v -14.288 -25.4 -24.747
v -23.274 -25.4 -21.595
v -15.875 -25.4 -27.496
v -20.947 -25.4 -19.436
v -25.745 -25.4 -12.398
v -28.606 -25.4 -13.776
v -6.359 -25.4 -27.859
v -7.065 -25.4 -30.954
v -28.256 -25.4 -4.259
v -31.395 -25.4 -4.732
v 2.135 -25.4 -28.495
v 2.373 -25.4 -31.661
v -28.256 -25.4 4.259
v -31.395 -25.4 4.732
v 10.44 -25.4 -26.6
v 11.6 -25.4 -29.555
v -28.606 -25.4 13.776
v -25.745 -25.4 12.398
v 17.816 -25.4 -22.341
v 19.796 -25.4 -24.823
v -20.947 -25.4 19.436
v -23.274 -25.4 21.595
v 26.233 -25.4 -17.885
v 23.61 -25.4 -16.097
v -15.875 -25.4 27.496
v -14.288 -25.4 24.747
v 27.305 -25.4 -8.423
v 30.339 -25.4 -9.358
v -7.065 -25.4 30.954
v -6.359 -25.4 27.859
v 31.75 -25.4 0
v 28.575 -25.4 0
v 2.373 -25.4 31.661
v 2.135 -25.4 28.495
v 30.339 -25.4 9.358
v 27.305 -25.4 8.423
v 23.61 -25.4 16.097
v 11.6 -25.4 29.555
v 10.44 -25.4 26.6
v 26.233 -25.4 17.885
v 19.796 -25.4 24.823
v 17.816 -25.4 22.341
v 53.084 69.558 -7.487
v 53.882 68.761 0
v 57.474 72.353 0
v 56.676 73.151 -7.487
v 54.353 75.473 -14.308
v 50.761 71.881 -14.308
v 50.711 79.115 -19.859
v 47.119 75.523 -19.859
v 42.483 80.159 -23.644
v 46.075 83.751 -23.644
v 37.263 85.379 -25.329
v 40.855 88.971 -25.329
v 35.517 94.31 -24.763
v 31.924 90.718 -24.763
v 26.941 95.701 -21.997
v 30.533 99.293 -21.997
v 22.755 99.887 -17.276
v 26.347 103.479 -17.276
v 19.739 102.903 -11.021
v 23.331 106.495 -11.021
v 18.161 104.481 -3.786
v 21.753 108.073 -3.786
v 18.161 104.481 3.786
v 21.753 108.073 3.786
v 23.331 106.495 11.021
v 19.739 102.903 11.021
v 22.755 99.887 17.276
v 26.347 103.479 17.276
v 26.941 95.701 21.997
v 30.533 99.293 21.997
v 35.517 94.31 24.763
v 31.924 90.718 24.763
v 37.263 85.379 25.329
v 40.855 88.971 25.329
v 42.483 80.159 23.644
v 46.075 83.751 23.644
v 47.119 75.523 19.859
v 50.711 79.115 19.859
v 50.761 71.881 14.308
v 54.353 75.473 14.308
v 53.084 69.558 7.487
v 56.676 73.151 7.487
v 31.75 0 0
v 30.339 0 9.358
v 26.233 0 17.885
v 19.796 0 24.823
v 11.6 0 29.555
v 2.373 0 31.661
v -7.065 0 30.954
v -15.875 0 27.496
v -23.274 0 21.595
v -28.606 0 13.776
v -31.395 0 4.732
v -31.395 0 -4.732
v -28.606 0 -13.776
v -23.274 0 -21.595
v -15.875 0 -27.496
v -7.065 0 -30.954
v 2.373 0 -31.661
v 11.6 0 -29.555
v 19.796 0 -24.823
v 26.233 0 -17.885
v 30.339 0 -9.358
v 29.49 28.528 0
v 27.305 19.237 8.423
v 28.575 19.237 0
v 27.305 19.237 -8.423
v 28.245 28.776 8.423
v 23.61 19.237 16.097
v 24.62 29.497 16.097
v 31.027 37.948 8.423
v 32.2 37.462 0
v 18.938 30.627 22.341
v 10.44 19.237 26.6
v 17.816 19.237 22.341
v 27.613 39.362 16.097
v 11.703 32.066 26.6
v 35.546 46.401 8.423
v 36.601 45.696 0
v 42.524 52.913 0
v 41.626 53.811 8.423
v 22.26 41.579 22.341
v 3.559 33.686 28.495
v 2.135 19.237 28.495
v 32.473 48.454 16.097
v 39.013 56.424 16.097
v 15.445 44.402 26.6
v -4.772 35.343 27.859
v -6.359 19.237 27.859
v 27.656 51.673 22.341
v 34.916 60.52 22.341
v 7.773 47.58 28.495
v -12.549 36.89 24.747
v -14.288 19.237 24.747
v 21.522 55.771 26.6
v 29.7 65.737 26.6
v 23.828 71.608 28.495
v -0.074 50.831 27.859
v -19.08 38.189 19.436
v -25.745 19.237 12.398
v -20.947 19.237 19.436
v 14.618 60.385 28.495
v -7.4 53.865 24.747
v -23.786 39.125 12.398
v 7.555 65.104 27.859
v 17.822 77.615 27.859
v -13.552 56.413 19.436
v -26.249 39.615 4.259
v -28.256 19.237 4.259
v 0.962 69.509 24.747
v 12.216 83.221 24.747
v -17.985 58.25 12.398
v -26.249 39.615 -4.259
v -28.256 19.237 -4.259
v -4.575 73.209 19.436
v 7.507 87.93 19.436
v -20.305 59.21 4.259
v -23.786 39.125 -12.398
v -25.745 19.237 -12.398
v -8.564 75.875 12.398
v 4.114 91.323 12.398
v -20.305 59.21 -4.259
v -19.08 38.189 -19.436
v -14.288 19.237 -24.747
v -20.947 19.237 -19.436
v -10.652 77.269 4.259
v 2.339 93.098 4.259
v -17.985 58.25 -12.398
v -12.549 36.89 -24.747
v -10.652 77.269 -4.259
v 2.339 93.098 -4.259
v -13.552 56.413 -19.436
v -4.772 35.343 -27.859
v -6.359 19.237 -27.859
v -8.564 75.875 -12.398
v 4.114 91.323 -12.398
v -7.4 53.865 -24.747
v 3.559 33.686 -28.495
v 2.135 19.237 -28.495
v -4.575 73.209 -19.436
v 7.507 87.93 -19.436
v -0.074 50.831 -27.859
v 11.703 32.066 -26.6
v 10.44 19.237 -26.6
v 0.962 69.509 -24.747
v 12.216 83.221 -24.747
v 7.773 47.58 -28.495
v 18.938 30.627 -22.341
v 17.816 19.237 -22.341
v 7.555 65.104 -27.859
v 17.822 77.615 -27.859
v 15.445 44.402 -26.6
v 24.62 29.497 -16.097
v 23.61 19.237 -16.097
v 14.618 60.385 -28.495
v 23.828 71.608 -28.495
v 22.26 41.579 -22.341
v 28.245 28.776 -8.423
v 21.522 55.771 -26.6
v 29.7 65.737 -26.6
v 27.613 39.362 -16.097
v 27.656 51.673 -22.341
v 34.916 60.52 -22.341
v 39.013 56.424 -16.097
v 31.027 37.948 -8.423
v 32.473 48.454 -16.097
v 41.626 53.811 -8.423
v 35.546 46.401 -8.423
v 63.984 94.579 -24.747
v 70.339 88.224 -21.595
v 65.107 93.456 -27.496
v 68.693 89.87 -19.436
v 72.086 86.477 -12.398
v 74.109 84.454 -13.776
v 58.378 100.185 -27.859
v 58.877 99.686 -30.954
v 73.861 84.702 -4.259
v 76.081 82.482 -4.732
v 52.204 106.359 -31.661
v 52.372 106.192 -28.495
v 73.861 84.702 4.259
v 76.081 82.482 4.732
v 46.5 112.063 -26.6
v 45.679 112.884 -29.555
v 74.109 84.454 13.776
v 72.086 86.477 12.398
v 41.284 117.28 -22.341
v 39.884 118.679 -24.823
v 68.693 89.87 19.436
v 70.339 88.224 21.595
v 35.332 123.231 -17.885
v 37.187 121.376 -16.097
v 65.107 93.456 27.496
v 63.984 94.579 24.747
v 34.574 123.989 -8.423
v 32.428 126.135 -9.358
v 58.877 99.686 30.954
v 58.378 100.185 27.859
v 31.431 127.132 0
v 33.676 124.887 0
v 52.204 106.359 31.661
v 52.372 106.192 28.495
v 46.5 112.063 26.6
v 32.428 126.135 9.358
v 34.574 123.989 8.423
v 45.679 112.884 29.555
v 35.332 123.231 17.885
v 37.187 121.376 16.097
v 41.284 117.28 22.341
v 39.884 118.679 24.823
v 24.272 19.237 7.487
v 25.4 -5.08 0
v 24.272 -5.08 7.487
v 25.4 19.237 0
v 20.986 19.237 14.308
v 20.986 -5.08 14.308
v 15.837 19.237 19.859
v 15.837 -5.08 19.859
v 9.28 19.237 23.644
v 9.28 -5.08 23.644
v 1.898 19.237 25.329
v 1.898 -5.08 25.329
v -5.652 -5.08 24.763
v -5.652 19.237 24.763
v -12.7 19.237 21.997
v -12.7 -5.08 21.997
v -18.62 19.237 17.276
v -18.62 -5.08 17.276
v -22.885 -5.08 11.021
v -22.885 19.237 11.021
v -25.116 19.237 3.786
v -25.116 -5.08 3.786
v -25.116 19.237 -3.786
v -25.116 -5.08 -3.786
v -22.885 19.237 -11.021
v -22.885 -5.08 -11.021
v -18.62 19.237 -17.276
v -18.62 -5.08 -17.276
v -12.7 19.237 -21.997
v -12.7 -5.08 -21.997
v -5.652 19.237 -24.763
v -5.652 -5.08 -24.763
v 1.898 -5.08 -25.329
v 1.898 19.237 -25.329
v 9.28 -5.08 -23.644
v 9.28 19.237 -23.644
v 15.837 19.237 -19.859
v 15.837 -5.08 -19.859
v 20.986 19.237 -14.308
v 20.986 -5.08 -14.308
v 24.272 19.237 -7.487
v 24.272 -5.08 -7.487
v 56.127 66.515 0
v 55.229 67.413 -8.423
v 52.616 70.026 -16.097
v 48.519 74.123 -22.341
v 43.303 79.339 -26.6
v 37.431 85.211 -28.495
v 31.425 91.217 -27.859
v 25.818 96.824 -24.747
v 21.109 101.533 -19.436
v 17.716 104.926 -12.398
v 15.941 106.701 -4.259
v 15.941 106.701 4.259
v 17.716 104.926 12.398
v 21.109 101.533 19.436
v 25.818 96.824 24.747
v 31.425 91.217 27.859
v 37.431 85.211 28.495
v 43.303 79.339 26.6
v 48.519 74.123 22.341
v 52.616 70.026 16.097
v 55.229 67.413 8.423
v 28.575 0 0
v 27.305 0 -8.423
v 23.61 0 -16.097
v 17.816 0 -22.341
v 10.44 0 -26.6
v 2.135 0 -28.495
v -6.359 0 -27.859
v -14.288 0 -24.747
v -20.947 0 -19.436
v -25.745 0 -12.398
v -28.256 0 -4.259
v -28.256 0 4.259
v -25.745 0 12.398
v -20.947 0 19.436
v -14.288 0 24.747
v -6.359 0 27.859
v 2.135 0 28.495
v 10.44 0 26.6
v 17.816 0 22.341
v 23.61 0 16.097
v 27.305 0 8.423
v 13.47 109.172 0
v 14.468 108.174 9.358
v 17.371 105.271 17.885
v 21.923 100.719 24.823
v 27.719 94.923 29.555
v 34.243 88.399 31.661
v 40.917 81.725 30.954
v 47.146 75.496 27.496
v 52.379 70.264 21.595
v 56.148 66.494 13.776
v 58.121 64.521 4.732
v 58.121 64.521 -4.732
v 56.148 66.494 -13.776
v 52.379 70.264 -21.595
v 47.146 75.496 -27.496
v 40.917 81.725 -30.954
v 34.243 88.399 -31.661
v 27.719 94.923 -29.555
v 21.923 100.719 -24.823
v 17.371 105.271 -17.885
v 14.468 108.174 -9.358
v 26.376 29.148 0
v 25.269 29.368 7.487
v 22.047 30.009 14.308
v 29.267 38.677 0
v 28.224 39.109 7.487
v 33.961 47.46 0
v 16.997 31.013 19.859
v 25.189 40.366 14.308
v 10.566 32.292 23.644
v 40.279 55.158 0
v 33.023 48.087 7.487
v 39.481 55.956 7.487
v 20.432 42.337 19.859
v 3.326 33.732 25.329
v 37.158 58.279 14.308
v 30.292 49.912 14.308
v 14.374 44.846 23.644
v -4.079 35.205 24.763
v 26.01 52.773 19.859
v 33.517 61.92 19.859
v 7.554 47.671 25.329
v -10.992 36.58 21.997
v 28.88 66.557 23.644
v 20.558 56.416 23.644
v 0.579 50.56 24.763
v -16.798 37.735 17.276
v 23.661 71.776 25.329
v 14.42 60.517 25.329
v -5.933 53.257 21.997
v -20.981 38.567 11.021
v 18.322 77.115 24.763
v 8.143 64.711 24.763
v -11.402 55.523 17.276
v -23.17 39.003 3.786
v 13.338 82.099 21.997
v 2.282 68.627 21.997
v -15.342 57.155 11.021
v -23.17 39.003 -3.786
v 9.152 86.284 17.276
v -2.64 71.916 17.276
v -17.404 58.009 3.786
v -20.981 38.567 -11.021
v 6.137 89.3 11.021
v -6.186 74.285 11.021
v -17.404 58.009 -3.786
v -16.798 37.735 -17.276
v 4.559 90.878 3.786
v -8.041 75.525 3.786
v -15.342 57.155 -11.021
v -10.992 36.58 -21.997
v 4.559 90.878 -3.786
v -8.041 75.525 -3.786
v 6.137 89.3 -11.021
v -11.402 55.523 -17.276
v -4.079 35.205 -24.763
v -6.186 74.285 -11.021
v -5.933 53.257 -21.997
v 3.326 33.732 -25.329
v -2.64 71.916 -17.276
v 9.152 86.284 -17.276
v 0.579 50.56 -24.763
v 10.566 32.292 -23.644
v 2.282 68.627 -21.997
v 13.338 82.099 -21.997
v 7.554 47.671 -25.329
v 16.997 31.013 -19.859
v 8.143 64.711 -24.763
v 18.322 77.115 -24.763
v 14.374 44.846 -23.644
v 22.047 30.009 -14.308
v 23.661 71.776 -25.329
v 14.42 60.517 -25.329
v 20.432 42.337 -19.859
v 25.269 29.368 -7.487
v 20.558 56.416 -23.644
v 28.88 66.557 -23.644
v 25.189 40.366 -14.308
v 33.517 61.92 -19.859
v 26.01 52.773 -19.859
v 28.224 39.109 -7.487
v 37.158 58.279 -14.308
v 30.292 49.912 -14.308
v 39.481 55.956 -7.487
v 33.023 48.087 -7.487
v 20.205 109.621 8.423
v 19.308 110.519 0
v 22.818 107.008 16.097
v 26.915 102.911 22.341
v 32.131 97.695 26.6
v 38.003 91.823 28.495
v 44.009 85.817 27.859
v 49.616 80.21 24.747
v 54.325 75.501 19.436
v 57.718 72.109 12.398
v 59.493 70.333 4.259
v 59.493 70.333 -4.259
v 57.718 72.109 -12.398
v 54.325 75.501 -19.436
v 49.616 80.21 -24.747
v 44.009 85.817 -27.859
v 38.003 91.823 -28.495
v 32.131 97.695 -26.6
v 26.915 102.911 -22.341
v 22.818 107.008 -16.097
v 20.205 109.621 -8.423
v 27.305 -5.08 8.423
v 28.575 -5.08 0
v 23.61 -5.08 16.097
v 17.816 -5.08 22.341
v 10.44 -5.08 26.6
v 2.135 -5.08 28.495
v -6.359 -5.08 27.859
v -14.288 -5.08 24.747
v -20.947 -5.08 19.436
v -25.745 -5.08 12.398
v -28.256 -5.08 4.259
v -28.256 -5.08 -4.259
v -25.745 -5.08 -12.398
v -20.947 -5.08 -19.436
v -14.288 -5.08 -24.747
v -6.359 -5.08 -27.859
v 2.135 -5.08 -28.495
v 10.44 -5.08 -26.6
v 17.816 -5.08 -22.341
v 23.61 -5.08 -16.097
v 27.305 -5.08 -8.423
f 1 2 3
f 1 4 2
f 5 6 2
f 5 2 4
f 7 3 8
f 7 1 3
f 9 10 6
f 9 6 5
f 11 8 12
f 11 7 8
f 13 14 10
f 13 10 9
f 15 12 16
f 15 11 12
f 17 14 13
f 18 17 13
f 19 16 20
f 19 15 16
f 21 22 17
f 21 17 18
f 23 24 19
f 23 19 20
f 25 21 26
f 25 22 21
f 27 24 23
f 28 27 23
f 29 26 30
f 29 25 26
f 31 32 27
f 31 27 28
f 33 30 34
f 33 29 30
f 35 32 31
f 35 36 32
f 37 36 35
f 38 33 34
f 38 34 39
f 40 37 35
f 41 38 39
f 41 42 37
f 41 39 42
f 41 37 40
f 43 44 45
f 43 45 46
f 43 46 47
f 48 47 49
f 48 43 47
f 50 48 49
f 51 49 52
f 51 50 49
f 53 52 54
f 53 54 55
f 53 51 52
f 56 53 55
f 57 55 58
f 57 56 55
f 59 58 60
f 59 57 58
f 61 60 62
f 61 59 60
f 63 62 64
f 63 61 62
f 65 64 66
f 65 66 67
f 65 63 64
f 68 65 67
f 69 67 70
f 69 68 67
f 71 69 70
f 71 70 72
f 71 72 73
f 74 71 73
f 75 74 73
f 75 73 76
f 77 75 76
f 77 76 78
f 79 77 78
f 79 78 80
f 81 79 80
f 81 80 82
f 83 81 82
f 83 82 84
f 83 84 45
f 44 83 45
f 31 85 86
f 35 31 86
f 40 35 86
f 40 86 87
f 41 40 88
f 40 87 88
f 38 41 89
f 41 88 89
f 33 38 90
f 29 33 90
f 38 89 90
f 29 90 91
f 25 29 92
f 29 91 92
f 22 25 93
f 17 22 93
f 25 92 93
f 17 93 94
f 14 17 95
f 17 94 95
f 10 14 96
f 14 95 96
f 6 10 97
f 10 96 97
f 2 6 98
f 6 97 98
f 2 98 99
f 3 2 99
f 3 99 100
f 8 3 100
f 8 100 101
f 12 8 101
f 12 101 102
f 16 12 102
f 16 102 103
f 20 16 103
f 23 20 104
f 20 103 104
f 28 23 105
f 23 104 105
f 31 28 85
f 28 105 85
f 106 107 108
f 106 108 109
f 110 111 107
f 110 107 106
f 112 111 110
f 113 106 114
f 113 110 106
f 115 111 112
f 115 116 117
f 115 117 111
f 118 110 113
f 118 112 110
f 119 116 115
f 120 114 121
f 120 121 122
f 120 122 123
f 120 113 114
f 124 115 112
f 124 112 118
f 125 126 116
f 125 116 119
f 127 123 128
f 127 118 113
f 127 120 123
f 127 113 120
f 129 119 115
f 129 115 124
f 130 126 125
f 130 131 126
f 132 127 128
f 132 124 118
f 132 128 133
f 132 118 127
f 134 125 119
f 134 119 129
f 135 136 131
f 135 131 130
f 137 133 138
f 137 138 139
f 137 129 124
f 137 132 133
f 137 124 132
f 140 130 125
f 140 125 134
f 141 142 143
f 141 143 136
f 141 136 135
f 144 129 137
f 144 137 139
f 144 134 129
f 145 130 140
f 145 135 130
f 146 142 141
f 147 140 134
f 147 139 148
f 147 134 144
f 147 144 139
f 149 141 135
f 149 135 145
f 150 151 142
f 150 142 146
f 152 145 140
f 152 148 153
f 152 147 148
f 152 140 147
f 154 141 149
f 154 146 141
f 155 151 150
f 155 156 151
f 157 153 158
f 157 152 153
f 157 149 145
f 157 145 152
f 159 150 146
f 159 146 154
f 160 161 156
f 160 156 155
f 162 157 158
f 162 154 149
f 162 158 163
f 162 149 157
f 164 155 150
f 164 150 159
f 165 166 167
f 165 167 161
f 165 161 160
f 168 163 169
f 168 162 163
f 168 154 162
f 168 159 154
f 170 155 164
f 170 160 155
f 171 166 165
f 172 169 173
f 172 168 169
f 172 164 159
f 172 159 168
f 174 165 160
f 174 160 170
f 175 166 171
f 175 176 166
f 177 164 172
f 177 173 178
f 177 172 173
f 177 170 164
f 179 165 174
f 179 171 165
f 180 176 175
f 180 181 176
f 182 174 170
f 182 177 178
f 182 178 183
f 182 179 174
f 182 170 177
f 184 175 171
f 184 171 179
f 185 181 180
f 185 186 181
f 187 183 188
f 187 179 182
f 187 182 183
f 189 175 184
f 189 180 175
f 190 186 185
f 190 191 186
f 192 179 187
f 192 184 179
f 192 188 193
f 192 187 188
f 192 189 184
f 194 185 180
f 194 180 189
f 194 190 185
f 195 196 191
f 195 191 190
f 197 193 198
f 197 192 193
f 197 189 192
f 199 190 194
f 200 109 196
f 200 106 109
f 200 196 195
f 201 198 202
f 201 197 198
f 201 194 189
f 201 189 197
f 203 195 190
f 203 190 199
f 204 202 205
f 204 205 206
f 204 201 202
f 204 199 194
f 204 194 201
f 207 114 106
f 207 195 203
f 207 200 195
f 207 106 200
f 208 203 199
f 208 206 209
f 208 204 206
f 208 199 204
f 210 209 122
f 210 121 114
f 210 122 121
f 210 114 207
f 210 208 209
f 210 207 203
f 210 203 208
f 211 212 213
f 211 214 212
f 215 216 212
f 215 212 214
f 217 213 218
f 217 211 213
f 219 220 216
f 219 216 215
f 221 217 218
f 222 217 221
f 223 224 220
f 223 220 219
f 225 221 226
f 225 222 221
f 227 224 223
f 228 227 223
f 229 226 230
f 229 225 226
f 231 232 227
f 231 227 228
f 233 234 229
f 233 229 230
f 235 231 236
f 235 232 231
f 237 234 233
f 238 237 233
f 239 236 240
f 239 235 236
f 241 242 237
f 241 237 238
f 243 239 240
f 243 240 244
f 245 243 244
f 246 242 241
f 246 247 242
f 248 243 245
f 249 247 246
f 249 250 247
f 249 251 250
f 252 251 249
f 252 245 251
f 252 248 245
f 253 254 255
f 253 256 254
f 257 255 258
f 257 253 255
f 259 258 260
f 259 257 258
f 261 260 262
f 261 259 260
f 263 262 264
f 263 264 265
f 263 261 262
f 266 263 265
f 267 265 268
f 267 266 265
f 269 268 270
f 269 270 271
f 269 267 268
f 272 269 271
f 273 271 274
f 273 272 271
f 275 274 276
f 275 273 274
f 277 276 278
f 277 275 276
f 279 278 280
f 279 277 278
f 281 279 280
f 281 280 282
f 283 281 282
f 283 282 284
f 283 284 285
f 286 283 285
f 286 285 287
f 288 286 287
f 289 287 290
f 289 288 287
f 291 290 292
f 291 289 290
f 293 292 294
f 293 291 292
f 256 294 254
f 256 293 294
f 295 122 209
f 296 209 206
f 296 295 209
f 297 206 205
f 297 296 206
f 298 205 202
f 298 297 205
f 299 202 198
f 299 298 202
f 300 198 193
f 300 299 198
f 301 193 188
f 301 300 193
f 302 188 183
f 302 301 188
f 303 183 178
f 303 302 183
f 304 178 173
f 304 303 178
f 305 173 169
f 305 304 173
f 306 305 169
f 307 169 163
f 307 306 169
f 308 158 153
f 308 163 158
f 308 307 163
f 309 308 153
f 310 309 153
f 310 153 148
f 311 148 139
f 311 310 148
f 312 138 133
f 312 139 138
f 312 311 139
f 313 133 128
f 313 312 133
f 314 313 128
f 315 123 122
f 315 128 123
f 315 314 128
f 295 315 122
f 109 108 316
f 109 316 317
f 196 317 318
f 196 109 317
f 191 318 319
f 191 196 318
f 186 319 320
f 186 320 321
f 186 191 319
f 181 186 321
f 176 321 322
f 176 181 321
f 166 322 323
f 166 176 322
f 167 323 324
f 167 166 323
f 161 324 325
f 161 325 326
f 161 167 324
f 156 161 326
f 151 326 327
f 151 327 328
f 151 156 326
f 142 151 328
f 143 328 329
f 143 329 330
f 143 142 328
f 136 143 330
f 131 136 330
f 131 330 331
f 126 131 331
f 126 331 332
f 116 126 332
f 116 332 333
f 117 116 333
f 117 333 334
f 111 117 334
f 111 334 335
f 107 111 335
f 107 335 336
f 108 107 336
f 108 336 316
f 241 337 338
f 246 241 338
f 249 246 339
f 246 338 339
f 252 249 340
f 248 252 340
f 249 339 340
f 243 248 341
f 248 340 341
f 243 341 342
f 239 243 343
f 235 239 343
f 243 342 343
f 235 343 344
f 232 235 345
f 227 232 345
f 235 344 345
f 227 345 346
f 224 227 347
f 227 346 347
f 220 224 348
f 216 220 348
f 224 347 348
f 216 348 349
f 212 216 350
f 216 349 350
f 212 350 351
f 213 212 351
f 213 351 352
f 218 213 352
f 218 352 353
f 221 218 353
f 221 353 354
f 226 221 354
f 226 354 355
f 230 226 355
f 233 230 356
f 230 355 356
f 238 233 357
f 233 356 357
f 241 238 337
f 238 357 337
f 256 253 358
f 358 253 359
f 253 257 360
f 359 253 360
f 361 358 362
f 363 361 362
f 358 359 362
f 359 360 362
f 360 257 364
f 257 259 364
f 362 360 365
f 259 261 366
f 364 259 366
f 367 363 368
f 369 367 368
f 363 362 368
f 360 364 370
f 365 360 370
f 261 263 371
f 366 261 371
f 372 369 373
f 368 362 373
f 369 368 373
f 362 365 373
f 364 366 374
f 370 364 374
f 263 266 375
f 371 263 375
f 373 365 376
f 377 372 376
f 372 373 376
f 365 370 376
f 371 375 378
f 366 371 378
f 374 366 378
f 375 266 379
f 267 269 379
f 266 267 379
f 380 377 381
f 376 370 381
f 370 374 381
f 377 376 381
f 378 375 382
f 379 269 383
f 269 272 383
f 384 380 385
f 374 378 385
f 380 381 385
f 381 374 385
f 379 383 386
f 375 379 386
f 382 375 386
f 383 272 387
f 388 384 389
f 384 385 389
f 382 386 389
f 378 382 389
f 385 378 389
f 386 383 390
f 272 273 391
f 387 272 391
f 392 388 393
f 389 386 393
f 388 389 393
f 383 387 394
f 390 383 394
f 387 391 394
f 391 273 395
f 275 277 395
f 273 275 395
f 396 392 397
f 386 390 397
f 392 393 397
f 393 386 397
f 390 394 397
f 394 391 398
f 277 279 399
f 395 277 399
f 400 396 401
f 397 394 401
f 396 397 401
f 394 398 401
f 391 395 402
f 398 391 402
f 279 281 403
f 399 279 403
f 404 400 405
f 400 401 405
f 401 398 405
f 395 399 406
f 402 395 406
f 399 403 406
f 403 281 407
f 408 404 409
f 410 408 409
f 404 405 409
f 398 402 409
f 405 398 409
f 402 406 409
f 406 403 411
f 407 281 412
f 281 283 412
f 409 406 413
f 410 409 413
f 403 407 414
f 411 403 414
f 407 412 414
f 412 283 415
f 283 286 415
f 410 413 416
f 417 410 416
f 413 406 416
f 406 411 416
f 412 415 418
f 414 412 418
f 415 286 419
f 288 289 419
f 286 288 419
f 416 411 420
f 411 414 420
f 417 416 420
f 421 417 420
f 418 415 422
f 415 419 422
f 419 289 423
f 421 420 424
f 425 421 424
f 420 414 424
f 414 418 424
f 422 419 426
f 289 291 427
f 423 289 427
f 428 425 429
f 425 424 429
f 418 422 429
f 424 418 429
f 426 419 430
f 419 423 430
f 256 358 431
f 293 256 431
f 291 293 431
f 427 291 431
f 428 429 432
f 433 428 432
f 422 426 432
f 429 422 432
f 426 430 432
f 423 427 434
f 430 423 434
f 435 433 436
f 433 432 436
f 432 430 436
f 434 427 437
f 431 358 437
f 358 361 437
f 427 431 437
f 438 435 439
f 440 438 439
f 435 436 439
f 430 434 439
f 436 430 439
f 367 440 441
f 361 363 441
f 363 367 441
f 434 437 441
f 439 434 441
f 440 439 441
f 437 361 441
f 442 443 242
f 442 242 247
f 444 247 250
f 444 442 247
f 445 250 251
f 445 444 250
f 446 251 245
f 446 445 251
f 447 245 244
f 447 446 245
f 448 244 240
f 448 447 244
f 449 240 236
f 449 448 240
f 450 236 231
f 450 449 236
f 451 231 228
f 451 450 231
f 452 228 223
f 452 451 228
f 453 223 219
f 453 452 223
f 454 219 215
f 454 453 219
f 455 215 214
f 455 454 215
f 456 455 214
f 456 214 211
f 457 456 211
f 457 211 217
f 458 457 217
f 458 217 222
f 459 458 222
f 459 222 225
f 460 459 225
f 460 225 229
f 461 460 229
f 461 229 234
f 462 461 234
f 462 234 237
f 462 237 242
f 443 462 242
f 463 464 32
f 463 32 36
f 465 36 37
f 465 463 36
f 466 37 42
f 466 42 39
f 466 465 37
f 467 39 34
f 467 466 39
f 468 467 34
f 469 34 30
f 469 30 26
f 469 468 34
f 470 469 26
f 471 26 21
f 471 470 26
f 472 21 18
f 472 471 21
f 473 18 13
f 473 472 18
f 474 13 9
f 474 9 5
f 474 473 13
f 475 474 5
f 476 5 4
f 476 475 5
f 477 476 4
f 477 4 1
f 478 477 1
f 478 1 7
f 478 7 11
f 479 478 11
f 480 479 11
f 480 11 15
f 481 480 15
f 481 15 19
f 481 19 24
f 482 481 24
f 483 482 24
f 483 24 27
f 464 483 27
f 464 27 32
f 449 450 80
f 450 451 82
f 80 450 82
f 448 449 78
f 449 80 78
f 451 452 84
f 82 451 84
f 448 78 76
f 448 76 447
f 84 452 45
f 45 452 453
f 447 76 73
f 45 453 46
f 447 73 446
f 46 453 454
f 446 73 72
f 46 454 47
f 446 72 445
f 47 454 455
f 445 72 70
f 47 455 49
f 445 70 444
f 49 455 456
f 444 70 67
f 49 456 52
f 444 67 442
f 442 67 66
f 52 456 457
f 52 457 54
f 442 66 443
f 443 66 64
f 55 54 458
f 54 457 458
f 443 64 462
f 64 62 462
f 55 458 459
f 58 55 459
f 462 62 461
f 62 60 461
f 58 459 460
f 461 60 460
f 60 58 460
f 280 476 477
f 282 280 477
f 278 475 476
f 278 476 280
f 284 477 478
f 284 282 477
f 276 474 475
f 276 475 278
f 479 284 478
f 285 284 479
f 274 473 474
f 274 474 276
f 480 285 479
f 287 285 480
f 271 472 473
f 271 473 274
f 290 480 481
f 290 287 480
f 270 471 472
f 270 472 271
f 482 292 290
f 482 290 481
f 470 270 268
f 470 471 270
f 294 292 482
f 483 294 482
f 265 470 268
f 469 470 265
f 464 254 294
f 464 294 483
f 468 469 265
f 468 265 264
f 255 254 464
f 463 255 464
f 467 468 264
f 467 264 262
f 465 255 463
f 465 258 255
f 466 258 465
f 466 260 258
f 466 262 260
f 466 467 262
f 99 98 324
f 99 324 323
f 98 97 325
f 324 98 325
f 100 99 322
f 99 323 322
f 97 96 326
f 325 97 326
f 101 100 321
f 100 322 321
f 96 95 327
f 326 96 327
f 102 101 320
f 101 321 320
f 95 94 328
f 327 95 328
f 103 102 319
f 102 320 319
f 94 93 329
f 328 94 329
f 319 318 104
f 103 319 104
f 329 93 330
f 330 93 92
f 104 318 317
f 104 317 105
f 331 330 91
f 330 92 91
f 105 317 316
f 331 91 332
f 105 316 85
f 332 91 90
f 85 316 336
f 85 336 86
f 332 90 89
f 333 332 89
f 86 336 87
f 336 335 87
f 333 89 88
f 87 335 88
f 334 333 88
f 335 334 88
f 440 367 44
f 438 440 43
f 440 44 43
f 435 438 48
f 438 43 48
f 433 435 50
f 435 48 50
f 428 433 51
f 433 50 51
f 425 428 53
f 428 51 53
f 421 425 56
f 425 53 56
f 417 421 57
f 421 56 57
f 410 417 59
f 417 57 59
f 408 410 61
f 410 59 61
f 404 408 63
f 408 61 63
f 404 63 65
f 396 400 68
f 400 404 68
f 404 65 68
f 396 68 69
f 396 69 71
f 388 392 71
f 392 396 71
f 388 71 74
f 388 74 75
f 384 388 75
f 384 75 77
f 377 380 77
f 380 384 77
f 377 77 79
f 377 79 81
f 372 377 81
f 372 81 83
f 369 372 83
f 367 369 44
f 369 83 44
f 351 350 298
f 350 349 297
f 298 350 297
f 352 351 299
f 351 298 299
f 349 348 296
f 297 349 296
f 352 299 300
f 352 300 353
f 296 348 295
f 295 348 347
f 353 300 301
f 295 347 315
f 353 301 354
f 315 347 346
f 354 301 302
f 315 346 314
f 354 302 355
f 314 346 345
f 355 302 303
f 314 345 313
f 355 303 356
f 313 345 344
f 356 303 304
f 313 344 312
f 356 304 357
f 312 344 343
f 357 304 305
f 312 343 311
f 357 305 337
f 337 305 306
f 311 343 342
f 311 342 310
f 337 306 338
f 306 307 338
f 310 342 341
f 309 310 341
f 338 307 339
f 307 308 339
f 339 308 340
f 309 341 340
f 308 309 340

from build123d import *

# Parameters (mm, degrees)
F0_R     = 28.575
F0_R_2   = 25.4
F3_DEPTH = 5.08
F0_R_3   = 31.75
F4_DEPTH = 25.4
F5_R     = 31.75
F5_R_2   = 28.575
F6_DEPTH = 25.4
F7_DEPTH = 5.08


with BuildPart() as f2:
    # F2: sweep along a path in F1
    with BuildLine(Plane.XY) as f2_path:
        Line((0, 0), (0, 19.2369265472))
        ThreePointArc((0, 19.2369265472), (5.8003796226, 48.3974040934), (22.3184632736, 73.1184632736))
        Line((22.3184632736, 73.1184632736), (35.9210244843, 86.7210244843))
    # F0 (on Front) → F2 (sweep)
    with BuildSketch(Plane.XZ):
        Circle(F0_R)
        Circle(F0_R_2, mode=Mode.SUBTRACT)
    sweep(path=f2_path.line)

    # F0 (on Front) → F3 (join)
    with BuildSketch(Plane.XZ):
        Circle(F0_R)
        Circle(F0_R_2, mode=Mode.SUBTRACT)
    extrude(amount=F3_DEPTH)

    # F0 (on Front) → F4 (join)
    with BuildSketch(Plane.XZ):
        Circle(F0_R_3)
        Circle(F0_R, mode=Mode.SUBTRACT)
    extrude(amount=F4_DEPTH)

    # F5 (on face) → F6 (join)
    with BuildSketch(Plane(origin=(61.3210244843, 61.3210244843, 0), x_dir=(-0.7071067812, 0.7071067812, 0), z_dir=(0.7071067812, 0.7071067812, 0))):
        with Locations((35.9210244843, 0)):
            Circle(F5_R)
        with Locations((35.9210244843, 0)):
            Circle(F5_R_2, mode=Mode.SUBTRACT)
    extrude(amount=F6_DEPTH)

    # F7 (add): a face of the model
    f7_faces = [f2.faces().sort_by_distance(p)[0] for p in [
        (35.9210244843, 86.7210244843, -27.7667769491),
    ]]
    extrude(f7_faces, amount=F7_DEPTH)


solid = f2.part
